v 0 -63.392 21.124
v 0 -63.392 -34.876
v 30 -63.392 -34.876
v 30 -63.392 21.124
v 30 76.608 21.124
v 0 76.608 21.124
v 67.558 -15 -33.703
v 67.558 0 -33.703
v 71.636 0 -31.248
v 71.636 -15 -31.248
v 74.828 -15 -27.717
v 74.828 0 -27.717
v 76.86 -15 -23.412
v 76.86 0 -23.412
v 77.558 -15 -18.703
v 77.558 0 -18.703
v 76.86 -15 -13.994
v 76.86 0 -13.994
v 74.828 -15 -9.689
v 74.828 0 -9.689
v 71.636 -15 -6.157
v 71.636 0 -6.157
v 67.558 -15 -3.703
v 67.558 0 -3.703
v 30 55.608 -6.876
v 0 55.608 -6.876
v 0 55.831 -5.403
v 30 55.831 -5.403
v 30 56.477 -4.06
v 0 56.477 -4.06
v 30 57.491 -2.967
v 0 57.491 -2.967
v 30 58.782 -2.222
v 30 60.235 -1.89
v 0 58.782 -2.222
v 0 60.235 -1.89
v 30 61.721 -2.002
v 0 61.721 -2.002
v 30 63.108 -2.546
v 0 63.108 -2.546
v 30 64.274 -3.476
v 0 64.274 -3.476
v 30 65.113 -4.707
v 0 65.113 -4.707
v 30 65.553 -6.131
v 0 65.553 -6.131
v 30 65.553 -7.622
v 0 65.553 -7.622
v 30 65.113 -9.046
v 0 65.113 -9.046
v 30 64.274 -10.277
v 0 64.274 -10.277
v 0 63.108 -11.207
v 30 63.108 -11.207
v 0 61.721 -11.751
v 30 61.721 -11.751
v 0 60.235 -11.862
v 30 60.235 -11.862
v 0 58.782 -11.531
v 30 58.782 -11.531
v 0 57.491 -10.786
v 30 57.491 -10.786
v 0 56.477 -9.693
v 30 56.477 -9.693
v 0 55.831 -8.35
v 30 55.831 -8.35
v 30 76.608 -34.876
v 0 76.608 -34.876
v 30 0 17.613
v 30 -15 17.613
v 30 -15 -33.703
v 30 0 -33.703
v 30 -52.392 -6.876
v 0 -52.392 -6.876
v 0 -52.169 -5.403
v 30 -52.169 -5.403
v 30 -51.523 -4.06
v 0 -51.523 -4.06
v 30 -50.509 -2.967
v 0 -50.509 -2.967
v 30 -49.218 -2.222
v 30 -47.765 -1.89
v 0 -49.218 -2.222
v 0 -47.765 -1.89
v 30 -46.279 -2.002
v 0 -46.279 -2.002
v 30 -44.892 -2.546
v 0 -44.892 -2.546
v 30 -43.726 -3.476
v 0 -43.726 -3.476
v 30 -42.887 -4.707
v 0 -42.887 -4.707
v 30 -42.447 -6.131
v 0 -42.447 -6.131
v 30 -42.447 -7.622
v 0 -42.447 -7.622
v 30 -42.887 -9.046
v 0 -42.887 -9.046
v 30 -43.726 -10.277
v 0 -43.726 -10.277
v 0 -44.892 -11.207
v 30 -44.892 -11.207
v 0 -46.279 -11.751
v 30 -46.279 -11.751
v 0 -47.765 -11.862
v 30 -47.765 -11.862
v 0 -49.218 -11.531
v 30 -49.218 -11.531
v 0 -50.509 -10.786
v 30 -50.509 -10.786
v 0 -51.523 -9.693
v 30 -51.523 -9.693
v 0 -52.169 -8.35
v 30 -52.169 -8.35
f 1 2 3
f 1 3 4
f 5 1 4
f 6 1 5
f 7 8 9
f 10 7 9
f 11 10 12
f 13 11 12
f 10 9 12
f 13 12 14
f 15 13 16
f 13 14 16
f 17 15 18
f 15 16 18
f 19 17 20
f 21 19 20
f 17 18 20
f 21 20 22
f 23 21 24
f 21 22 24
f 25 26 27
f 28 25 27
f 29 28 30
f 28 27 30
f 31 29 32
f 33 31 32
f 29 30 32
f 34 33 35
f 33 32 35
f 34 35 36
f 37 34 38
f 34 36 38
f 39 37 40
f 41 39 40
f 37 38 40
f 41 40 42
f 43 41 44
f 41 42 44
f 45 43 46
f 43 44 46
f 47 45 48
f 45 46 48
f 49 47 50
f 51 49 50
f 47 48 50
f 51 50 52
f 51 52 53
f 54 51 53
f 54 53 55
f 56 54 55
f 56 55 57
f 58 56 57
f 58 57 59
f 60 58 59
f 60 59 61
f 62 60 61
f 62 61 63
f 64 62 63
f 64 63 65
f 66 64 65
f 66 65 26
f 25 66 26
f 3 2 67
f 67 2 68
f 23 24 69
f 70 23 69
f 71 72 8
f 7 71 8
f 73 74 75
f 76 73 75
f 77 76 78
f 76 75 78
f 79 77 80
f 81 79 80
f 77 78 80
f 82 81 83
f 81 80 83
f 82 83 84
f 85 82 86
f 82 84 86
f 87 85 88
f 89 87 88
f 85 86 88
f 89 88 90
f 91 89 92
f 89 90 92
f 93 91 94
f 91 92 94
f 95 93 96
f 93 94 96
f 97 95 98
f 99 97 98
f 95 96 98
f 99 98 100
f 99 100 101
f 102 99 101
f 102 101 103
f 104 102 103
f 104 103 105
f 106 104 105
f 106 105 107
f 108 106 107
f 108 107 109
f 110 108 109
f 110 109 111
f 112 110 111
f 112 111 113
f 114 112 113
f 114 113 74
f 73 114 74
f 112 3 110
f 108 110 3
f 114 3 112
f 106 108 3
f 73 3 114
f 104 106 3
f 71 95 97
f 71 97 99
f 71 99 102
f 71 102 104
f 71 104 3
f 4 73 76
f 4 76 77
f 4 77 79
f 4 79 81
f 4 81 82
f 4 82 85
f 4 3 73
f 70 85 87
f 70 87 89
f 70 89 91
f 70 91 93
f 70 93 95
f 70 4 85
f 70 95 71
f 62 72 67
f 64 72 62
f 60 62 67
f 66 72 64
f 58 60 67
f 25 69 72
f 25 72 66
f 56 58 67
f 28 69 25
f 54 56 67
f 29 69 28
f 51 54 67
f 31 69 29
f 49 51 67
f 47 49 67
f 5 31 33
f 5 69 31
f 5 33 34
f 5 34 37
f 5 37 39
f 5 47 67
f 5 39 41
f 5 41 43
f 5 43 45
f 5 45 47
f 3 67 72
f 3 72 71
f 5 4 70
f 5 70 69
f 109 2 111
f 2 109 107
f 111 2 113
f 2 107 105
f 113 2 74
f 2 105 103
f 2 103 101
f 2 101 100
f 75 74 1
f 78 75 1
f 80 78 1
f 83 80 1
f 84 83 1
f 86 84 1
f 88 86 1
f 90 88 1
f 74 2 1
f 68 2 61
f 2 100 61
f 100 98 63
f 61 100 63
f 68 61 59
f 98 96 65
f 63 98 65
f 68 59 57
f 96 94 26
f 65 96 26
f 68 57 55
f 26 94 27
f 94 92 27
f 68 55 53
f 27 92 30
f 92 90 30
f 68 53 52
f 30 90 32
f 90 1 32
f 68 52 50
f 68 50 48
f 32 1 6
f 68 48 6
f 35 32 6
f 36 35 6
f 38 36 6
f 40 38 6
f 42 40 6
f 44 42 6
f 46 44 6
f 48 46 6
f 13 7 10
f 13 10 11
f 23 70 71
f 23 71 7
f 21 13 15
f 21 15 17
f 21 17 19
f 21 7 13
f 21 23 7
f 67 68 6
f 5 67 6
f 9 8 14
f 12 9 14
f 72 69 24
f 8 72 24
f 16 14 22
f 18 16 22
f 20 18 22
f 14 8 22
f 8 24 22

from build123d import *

# Parameters (mm, degrees)
F0_W     = 140
F0_H     = 56
F1_DEPTH = 30
F4_D     = 10
F5_D     = 10
F7_DEPTH = 15


with BuildPart() as f1:
    # F0 (on Right) → F1 (new body)
    with BuildSketch(Plane.YZ):
        with Locations((6.608495, -6.87645)):
            Rectangle(F0_W, F0_H)
    extrude(amount=F1_DEPTH)

    # F4 (through all)
    with Locations(Plane.YZ.offset(30)):
        with Locations((-47.391505, -6.87645)):
            Hole(F4_D / 2)

    # F5 (through all)
    with Locations(Plane.YZ.offset(30)):
        with Locations((60.608495, -6.87645)):
            Hole(F5_D / 2)

    # F6 (on Front) → F7 (join)
    with BuildSketch(Plane.XZ):
        Polygon((27.557567, 18.999426), (27.557567, -3.702652), (30.328274, -3.702652), (67.557567, -3.702652), align=None)
        Polygon((30.328274, -3.702652), (27.557567, -3.702652), (27.557567, -33.702652), (67.557567, -33.702652), (67.557567, -3.702652), align=None)
        with BuildLine():
            ThreePointArc((67.557567, -33.702652), (77.557567, -18.702652), (67.557567, -3.702652))
            Line((67.557567, -3.702652), (67.557567, -33.702652))
        make_face()
    extrude(amount=F7_DEPTH)


solid = f1.part
